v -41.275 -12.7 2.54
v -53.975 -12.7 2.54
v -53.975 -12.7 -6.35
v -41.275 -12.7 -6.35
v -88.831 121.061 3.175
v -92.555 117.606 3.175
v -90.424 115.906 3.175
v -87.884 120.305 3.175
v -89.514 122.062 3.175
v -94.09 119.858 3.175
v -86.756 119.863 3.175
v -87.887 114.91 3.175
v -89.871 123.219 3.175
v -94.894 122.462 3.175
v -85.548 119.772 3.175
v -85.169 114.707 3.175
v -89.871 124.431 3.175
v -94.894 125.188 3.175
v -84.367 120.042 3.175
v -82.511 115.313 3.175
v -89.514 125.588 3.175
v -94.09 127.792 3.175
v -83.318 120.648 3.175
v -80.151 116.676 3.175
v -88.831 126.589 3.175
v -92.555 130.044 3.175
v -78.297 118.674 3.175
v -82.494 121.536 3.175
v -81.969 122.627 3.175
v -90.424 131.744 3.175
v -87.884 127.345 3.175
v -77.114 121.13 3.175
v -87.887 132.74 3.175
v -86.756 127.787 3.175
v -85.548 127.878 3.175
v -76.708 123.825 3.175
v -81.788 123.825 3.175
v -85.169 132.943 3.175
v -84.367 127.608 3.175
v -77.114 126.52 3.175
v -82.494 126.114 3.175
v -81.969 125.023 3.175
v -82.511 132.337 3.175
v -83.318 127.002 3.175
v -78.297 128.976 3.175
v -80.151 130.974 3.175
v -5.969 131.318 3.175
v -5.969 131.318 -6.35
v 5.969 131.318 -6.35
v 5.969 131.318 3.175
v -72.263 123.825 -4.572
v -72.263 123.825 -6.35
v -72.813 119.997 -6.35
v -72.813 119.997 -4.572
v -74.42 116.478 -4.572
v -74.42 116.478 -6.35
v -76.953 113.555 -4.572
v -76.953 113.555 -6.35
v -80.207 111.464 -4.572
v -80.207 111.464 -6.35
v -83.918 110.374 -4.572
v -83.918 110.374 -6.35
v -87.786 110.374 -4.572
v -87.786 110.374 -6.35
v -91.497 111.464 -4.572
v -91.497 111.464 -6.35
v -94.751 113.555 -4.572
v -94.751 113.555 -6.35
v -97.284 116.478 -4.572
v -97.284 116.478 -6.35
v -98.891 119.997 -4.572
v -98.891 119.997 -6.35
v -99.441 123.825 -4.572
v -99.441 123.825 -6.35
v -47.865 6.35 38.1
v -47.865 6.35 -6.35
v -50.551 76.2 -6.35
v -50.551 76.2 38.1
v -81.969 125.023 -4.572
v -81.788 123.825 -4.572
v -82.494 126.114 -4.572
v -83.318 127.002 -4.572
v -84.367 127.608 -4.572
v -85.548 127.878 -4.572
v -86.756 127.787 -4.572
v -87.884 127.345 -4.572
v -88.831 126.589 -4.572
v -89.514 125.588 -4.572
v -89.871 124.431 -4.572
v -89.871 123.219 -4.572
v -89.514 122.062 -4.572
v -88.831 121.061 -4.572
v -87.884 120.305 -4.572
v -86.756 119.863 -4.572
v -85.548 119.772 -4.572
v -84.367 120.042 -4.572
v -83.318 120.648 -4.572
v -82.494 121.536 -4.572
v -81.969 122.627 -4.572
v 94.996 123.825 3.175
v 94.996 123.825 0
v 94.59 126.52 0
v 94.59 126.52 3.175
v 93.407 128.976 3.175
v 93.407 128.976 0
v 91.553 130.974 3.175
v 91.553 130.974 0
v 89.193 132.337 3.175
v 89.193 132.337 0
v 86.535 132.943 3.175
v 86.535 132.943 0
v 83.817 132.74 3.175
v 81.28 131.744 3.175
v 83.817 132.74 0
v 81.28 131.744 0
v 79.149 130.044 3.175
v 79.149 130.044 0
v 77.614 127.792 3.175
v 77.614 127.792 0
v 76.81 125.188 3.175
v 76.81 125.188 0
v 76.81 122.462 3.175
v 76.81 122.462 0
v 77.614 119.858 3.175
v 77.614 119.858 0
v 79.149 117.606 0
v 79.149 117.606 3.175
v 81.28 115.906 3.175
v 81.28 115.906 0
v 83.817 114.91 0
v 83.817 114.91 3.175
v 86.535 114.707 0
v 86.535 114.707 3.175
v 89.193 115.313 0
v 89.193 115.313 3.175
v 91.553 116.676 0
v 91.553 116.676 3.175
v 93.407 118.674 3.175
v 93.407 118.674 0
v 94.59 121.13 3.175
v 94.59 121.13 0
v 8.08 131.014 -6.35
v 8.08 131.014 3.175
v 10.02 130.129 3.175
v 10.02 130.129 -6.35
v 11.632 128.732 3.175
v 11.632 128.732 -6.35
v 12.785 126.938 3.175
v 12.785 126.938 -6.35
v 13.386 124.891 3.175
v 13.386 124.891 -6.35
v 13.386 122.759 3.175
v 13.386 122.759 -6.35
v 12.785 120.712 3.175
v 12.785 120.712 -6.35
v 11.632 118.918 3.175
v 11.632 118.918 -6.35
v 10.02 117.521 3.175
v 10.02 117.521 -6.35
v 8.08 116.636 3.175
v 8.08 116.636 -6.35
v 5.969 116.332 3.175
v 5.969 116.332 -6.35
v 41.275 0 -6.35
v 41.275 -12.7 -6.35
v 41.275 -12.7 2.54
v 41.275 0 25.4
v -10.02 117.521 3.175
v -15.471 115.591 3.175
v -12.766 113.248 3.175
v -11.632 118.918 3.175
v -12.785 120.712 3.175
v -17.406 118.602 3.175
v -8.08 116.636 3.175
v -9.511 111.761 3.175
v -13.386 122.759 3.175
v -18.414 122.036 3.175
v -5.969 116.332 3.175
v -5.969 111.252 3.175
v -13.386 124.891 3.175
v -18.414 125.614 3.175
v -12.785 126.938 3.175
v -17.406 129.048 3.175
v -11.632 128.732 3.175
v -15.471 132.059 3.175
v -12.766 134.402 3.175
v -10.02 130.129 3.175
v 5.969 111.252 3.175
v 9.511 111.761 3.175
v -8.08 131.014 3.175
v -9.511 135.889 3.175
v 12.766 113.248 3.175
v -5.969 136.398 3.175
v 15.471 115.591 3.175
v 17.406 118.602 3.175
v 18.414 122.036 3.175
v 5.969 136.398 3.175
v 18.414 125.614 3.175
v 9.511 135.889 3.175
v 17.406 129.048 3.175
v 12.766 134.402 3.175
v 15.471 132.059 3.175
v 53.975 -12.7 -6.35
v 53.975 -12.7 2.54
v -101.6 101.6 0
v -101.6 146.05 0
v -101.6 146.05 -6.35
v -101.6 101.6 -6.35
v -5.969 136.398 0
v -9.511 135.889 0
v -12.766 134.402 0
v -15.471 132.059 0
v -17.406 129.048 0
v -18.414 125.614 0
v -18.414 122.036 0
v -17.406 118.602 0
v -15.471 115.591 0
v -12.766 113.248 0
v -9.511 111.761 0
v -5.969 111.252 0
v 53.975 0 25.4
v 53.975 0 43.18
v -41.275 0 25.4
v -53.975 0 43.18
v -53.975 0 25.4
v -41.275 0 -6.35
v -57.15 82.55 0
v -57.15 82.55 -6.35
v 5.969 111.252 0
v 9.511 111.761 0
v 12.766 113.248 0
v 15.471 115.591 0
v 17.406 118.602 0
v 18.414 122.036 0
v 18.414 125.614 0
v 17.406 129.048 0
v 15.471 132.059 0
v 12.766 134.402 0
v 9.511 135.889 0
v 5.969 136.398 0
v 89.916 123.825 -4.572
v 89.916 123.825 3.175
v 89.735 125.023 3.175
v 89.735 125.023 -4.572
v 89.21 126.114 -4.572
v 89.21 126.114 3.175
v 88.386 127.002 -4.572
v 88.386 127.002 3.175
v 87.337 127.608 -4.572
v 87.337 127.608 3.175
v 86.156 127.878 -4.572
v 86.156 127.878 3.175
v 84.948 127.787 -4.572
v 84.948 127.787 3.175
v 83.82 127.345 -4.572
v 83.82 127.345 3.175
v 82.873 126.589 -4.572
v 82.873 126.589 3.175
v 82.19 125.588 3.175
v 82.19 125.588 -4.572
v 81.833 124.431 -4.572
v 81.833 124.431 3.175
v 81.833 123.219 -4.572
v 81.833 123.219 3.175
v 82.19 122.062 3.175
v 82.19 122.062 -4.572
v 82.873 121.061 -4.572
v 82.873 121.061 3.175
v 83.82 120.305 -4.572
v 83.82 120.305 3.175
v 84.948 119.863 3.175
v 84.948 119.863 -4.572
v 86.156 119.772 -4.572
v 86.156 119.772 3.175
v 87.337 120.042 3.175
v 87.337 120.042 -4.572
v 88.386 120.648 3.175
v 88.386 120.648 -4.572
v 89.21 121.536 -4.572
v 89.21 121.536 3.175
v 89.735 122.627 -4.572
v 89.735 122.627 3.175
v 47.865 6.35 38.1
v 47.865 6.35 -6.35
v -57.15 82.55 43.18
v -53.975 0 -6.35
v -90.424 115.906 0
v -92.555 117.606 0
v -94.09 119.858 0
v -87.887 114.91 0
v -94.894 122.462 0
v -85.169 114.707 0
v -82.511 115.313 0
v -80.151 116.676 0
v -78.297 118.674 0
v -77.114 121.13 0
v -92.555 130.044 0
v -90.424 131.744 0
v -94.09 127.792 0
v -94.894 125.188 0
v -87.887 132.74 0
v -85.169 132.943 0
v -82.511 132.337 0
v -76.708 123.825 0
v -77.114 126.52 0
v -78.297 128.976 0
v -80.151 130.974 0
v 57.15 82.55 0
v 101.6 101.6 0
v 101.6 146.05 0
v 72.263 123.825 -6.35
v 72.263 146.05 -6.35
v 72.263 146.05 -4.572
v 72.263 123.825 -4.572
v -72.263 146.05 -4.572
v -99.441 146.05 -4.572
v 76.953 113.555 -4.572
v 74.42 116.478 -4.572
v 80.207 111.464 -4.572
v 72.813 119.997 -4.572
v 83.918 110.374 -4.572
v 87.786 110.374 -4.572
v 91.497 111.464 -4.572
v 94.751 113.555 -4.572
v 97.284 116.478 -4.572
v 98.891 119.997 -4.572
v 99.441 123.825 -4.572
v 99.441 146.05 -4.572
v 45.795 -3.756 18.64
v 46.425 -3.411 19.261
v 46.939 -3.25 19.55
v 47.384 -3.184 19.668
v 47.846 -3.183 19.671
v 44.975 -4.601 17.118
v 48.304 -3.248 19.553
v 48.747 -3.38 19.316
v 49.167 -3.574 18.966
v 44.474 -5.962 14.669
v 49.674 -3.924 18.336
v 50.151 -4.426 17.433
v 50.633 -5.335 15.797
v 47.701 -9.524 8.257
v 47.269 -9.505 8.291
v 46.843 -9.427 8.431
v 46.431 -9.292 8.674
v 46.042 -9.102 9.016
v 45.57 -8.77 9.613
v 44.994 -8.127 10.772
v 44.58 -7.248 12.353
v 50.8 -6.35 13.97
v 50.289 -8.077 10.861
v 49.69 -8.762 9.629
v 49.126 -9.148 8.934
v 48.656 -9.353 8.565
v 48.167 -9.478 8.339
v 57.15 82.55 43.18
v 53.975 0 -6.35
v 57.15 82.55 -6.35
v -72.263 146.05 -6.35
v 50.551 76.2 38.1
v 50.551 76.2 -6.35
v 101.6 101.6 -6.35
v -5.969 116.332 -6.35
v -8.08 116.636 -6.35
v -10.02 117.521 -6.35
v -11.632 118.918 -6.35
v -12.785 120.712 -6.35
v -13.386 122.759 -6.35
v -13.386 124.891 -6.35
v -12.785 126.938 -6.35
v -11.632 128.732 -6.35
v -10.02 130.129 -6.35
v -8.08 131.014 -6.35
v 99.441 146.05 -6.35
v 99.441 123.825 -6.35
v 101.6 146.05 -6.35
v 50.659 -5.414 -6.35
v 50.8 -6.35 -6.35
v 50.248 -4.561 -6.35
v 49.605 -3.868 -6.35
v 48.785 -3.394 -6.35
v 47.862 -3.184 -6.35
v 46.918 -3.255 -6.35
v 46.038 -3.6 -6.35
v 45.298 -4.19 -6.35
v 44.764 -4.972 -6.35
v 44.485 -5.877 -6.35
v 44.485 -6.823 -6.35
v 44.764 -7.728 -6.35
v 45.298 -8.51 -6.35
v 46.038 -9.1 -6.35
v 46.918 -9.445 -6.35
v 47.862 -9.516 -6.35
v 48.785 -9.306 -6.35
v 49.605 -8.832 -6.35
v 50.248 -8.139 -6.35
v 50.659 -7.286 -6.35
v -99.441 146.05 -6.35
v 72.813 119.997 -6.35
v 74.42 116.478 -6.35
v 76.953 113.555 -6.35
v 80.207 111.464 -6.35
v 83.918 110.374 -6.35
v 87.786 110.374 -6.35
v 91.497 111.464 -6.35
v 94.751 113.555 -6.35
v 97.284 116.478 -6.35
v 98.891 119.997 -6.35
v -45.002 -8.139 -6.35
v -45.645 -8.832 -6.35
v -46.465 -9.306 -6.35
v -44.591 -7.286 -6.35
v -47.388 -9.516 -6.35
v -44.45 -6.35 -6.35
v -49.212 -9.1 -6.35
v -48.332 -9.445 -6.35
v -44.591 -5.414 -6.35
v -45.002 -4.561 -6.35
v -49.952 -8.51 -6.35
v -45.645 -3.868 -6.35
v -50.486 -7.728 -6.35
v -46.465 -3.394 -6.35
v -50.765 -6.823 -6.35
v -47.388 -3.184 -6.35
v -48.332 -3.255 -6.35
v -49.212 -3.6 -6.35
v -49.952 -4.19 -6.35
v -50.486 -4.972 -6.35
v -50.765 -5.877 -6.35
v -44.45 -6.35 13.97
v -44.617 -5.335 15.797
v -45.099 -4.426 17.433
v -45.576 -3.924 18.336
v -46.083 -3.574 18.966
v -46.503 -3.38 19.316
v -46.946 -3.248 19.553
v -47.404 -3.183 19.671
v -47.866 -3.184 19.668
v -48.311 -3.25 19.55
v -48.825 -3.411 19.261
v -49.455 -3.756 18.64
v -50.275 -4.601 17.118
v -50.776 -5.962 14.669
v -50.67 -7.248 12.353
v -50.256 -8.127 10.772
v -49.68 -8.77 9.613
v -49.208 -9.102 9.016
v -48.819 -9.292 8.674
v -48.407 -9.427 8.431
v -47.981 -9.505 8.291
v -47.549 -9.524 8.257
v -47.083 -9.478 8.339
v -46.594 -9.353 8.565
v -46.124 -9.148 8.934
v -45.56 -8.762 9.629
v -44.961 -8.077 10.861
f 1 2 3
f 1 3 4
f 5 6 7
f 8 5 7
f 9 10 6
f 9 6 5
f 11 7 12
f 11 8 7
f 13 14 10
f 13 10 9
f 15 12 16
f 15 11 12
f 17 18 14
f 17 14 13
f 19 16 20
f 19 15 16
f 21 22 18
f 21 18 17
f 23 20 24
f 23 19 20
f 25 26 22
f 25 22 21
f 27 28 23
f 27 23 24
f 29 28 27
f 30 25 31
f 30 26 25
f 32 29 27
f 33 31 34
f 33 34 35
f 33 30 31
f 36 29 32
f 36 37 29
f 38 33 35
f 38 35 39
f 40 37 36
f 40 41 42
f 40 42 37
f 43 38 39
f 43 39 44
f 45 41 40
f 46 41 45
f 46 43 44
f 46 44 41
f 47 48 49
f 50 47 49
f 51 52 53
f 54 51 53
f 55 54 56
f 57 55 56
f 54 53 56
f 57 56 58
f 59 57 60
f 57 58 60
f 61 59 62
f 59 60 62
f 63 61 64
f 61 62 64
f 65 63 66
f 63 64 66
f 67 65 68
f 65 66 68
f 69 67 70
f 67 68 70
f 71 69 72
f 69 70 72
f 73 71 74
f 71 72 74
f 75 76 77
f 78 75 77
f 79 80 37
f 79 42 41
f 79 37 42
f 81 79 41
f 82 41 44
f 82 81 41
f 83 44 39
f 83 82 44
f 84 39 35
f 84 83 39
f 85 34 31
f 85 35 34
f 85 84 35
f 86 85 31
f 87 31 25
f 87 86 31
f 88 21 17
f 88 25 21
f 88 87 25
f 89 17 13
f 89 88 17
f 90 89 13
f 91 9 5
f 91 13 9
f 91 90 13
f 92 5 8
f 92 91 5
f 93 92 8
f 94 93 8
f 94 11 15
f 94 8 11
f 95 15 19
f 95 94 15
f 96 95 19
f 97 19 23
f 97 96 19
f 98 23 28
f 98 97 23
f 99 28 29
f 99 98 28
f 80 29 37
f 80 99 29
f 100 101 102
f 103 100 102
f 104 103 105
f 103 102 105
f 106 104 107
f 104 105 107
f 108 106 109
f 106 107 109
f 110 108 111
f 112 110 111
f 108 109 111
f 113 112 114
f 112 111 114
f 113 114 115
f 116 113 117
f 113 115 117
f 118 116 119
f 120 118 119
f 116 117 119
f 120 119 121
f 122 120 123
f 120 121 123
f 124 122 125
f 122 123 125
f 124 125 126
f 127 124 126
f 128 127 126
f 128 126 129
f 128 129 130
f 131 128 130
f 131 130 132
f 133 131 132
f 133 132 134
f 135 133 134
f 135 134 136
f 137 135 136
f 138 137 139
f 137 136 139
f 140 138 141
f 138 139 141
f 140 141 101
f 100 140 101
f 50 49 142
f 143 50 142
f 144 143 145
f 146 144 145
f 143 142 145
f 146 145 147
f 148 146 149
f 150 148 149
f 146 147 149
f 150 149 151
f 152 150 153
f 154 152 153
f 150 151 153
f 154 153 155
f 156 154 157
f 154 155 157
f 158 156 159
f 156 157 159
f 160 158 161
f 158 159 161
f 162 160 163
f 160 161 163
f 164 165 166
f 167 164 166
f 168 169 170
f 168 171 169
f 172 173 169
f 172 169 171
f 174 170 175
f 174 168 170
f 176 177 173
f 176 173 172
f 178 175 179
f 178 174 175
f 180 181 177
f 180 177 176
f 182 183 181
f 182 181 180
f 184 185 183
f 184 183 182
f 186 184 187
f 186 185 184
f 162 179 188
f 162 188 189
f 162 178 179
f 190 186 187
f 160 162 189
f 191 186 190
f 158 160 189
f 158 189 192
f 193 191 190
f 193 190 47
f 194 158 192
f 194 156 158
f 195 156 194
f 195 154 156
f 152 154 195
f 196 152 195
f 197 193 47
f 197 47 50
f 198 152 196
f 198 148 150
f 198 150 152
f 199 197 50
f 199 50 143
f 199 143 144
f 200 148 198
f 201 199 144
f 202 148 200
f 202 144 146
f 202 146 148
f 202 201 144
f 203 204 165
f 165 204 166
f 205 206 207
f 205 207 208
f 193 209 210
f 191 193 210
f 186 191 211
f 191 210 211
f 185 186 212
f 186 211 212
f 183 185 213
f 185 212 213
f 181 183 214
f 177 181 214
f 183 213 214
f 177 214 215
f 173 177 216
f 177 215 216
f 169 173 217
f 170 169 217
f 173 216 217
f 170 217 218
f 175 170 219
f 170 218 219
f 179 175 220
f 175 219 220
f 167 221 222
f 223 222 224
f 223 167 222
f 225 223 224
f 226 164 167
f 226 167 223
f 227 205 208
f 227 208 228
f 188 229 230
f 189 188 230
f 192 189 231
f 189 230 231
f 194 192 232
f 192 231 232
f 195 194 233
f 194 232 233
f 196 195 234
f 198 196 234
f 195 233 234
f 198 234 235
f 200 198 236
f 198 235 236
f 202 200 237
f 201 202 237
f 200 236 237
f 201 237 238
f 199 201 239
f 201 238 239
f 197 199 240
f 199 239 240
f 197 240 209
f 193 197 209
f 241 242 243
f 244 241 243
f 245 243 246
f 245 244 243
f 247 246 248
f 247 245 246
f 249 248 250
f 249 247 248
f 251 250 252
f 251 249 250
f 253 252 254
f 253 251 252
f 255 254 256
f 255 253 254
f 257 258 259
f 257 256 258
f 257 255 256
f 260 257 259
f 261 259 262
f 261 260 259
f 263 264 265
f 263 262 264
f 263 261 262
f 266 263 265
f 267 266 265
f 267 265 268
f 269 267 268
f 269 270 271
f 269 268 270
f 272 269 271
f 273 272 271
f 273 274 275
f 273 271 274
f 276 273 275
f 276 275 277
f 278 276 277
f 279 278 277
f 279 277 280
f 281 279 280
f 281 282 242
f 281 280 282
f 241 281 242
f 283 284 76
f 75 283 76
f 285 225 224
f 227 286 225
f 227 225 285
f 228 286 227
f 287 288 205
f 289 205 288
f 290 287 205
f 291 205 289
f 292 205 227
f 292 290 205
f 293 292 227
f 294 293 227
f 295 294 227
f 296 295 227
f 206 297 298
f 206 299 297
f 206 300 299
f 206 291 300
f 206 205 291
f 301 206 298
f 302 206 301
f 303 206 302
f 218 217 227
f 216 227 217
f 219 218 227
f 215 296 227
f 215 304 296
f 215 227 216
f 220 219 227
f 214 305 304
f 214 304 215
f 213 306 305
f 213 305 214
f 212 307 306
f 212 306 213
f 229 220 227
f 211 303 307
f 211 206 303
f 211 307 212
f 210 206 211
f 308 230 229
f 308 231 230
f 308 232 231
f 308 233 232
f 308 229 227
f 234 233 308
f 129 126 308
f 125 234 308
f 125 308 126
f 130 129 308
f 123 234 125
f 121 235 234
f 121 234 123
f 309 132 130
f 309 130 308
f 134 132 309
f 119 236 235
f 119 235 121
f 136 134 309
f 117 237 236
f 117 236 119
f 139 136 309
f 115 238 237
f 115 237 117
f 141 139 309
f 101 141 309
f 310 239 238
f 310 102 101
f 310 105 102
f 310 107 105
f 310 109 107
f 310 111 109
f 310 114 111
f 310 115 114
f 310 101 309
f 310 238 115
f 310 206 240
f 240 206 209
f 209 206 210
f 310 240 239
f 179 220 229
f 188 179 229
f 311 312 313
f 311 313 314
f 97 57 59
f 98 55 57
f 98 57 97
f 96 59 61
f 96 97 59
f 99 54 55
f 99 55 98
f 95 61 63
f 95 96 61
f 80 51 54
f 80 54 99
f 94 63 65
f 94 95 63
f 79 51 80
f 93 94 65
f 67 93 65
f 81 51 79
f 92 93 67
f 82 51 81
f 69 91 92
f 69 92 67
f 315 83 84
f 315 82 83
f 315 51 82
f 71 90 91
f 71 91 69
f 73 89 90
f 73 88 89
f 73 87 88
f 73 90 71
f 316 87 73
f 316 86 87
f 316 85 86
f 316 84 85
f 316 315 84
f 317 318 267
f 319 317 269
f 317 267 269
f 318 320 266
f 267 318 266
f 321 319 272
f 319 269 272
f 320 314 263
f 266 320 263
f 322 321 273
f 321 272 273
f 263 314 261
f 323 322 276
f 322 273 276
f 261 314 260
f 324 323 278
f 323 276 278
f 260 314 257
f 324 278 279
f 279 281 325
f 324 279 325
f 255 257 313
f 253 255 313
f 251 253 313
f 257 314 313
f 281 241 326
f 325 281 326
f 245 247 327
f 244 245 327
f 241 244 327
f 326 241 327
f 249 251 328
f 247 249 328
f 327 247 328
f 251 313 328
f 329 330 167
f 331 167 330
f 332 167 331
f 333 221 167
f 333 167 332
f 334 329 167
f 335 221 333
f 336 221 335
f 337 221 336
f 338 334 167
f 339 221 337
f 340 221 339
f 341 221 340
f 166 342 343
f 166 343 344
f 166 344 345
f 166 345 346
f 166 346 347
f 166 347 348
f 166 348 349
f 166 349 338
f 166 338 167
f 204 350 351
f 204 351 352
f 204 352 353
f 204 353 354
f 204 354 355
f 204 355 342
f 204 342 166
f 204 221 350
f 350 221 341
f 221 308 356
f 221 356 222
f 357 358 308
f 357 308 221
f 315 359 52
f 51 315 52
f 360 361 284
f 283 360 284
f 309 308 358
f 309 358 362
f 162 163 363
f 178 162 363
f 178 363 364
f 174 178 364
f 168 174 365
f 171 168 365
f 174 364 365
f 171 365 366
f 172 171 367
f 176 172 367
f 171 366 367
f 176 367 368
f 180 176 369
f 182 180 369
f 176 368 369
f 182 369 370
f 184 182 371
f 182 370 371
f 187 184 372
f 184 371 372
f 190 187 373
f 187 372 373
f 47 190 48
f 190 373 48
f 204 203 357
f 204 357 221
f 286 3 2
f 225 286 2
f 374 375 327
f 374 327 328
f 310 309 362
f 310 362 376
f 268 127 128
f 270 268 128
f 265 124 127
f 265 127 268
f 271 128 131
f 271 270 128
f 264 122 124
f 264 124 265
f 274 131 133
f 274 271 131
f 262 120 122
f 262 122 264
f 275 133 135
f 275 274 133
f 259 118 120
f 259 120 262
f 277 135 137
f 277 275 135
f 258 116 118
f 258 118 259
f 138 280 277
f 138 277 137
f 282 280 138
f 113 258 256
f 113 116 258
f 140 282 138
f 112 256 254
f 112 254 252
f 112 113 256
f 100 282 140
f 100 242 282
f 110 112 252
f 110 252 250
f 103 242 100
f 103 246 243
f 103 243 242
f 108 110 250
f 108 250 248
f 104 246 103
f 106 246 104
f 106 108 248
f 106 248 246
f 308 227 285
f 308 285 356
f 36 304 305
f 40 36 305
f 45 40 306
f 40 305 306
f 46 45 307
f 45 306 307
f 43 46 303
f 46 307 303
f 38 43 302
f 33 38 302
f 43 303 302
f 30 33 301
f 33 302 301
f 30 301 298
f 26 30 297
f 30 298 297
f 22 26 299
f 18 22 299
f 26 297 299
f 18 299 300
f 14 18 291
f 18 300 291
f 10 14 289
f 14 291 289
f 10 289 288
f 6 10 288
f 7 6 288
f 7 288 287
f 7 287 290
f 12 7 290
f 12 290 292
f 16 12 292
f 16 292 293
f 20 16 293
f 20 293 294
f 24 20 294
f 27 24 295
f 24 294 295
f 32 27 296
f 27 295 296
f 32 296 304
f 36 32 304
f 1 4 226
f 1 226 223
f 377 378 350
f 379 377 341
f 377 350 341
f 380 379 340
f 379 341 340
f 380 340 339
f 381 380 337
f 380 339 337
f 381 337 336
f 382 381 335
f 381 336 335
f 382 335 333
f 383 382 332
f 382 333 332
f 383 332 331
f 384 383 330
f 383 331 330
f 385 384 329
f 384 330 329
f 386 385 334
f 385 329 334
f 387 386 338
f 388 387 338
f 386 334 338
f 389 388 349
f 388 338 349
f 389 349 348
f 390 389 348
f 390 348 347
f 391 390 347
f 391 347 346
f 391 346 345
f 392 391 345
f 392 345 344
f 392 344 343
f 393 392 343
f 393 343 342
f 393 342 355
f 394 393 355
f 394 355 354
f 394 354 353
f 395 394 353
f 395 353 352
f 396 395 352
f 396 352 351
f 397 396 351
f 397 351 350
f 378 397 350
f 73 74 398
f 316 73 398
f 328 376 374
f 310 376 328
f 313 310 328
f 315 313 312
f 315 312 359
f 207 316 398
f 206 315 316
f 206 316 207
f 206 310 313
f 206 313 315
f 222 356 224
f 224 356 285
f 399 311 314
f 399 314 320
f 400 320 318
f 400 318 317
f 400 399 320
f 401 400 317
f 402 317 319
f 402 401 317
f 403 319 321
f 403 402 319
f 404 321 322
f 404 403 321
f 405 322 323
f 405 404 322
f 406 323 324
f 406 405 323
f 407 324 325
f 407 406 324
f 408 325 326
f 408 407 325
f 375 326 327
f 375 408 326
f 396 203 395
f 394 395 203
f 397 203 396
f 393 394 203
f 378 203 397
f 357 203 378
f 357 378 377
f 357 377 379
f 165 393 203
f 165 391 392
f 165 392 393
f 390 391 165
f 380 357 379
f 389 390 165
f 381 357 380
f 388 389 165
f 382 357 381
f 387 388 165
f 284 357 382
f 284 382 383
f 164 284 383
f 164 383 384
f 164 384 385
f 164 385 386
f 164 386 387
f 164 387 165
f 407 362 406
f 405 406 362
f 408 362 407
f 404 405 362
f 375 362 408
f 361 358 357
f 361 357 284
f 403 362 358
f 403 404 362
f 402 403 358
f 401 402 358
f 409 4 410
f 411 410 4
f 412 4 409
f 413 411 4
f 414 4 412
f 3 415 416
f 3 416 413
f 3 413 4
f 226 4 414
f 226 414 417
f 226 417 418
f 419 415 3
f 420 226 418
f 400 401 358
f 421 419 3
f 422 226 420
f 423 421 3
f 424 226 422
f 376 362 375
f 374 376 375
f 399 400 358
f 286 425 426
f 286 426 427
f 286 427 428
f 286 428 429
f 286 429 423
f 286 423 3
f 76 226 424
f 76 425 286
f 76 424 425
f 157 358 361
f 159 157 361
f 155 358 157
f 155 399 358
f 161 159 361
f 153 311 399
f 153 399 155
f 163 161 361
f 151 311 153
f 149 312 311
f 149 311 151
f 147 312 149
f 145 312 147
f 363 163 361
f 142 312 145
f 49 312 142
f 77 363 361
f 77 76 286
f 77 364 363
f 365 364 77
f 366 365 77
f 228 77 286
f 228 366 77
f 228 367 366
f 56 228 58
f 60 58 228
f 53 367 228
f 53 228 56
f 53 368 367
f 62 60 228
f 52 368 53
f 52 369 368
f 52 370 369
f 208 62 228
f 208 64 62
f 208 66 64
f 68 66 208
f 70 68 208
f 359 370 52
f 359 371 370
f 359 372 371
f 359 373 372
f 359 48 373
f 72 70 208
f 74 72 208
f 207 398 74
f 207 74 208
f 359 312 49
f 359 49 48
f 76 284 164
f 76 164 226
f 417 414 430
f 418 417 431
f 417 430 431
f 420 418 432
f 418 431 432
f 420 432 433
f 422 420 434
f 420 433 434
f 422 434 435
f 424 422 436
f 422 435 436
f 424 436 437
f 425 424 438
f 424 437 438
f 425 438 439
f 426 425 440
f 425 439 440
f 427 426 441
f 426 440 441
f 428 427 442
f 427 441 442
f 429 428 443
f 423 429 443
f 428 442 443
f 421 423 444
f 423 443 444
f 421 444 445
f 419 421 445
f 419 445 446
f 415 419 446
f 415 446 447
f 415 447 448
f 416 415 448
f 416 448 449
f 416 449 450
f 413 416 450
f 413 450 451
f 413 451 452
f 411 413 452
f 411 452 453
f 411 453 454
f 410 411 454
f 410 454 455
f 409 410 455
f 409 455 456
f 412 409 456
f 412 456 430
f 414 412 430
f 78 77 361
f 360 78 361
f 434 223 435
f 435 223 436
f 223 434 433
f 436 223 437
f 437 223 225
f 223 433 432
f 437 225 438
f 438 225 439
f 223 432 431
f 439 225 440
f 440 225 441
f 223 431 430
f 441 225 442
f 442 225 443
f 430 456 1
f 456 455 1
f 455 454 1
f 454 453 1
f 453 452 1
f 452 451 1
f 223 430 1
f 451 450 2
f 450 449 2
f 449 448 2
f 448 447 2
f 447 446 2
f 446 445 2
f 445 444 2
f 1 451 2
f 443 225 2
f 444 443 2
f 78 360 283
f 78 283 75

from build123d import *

# Parameters (mm, degrees)
MAIN_BODY_DEPTH                    = 6.35
POCKET_OUTER_SURFACE_DEPTH         = 43.18
POCKET_INSIDE_DEPTH                = 44.45
SKETCH8_W                          = 12.7
SKETCH8_H                          = 31.75
BOTTOM_SCREW_MOUNT_DEPTH           = 12.7
BOTTOM_SCREW_MOUNT_EXTRUSION_DEPTH = 218.712414724
LIGHT_SOCKETS_DEPTH                = 184.078329957
LIGHT_SOCKETS_DEPTH_BACK           = 6.35
SKETCH17_R                         = 4.064
SKETCH18_R                         = 9.144
LIGHT_LIP_LINERS_DEPTH             = 3.175
LIGHT_LIP_SOCKETS_REACH            = 185.078
SKETCH17_2_R                       = 4.064
TAB_SLOTS_DEPTH                    = 1.778
F_1_4_0_25_DIAMETER_HOLE1_D        = 6.35


# Sheet-metal steps are written as plain solids
with BuildPart() as part:
    # Sketch1 → Main Body (new body)
    with BuildSketch(Plane.XY):
        Polygon((-53.975, 0), (53.975, 0), (57.15, 82.55), (101.6, 101.6), (101.6, 146.05), (-101.6, 146.05), (-101.6, 101.6), (-57.15, 82.55), align=None)
    extrude(amount=-MAIN_BODY_DEPTH)

    # Sketch6 → Pocket-Outer Surface (add)
    with BuildSketch(Plane.XY):
        Polygon((53.975, 0), (-53.975, 0), (-57.15, 82.55), (57.15, 82.55), align=None)
    extrude(amount=POCKET_OUTER_SURFACE_DEPTH)

    # Sketch7 → Pocket-Inside (cut)
    with BuildSketch(Plane(origin=(0, 0, -6.35), x_dir=(-1, 0, 0), z_dir=(0, 0, -1))):
        Polygon((-50.551074221, 76.2), (-47.864535759, 6.35), (47.864535759, 6.35), (50.551074221, 76.2), align=None)
    extrude(amount=-POCKET_INSIDE_DEPTH, mode=Mode.SUBTRACT)

    # Sketch8 → Bottom Screw Mount (add)
    with BuildSketch(Plane.XZ):
        with Locations((-47.625, 9.525)):
            Rectangle(SKETCH8_W, SKETCH8_H)
    bottom_screw_mount = extrude(amount=BOTTOM_SCREW_MOUNT_DEPTH)

    # Sketch9 → Bottom Screw Mount Extrusion (cut, through all)
    with BuildSketch(Plane.ZY.offset(53.975)):
        Polygon((2.54, -12.7), (25.4, -12.7), (25.4, 0), align=None)
    bottom_screw_mount_extrusion = extrude(amount=-BOTTOM_SCREW_MOUNT_EXTRUSION_DEPTH, mode=Mode.SUBTRACT)

    # Left Bottom Screw Mount: Bottom Screw Mount, Bottom Screw Mount Extrusion across plane
    add(bottom_screw_mount.mirror(Plane(origin=(0, 0, 0), x_dir=(0, 0, 1), z_dir=(1, 0, 0))))
    add(bottom_screw_mount_extrusion.mirror(Plane(origin=(0, 0, 0), x_dir=(0, 0, 1), z_dir=(1, 0, 0))), mode=Mode.SUBTRACT)

    # Sketch17 → Light Sockets (cut, two sides: drawn at the far end of the back side and taken through both)
    with BuildSketch(Plane.XY.offset(-LIGHT_SOCKETS_DEPTH_BACK)):
        with Locations((85.852, 123.825)):
            Circle(SKETCH17_R)
        with Locations((-85.852, 123.825)):
            Circle(SKETCH17_R)
        with BuildLine():
            Line((-5.969, 131.318), (5.969, 131.318))
            ThreePointArc((5.969, 131.318), (13.462, 123.825), (5.969, 116.332))
            Line((5.969, 116.332), (-5.969, 116.332))
            ThreePointArc((-5.969, 116.332), (-13.462, 123.825), (-5.969, 131.318))
        make_face()
    extrude(amount=LIGHT_SOCKETS_DEPTH + LIGHT_SOCKETS_DEPTH_BACK, mode=Mode.SUBTRACT)

    # Sketch18 → Light Lip Liners (add)
    with BuildSketch(Plane.XY):
        with Locations((-85.852, 123.825)):
            Circle(SKETCH18_R)
        with Locations((85.852, 123.825)):
            Circle(SKETCH18_R)
        with BuildLine():
            Line((5.969, 136.398), (-5.969, 136.398))
            ThreePointArc((-5.969, 136.398), (-18.542, 123.825), (-5.969, 111.252))
            Line((-5.969, 111.252), (5.969, 111.252))
            ThreePointArc((5.969, 111.252), (18.542, 123.825), (5.969, 136.398))
        make_face()
    extrude(amount=LIGHT_LIP_LINERS_DEPTH)

    # Sketch17<2> → Light Lip Sockets (cut, up to next)
    with BuildSketch(Plane.XY, mode=Mode.PRIVATE) as light_lip_sockets_sk1:
        with Locations((85.852, 123.825)):
            Circle(SKETCH17_2_R)
    light_lip_sockets_tool1 = extrude(light_lip_sockets_sk1.sketch, amount=LIGHT_LIP_SOCKETS_REACH, mode=Mode.PRIVATE) & part.part
    # Sketch17<2> → Light Lip Sockets (cut, up to next)
    with BuildSketch(Plane.XY, mode=Mode.PRIVATE) as light_lip_sockets_sk2:
        with Locations((-85.852, 123.825)):
            Circle(SKETCH17_2_R)
    light_lip_sockets_tool2 = extrude(light_lip_sockets_sk2.sketch, amount=LIGHT_LIP_SOCKETS_REACH, mode=Mode.PRIVATE) & part.part
    # Sketch17<2> → Light Lip Sockets (cut, up to next)
    with BuildSketch(Plane.XY, mode=Mode.PRIVATE) as light_lip_sockets_sk3:
        with BuildLine():
            Line((-5.969, 131.318), (5.969, 131.318))
            ThreePointArc((5.969, 131.318), (13.462, 123.825), (5.969, 116.332))
            Line((5.969, 116.332), (-5.969, 116.332))
            ThreePointArc((-5.969, 116.332), (-13.462, 123.825), (-5.969, 131.318))
        make_face()
    light_lip_sockets_tool3 = extrude(light_lip_sockets_sk3.sketch, amount=LIGHT_LIP_SOCKETS_REACH, mode=Mode.PRIVATE) & part.part
    add(light_lip_sockets_tool1.solids().sort_by_distance((85.852, 123.825, 0))[0], mode=Mode.SUBTRACT)
    add(light_lip_sockets_tool2.solids().sort_by_distance((-85.852, 123.825, 0))[0], mode=Mode.SUBTRACT)
    add(light_lip_sockets_tool3.solids().sort_by_distance((0, 123.825, 0))[0], mode=Mode.SUBTRACT)

    # Sketch19 → Tab Slots (cut)
    with BuildSketch(Plane(origin=(0, 0, -6.35), x_dir=(-1, 0, 0), z_dir=(0, 0, -1))):
        with BuildLine():
            Line((72.263, 146.05), (72.263, 123.825))
            ThreePointArc((72.263, 123.825), (85.852, 110.236), (99.441, 123.825))
            Line((99.441, 123.825), (99.441, 146.05))
            Line((99.441, 146.05), (72.263, 146.05))
        make_face()
    tab_slots = extrude(amount=-TAB_SLOTS_DEPTH, mode=Mode.SUBTRACT)

    # Mirror3: Tab Slots across plane
    add(tab_slots.mirror(Plane(origin=(0, 0, 0), x_dir=(0, 0, 1), z_dir=(1, 0, 0))), mode=Mode.SUBTRACT)

    # 1/4 (0.25) Diameter Hole1 (through all)
    with Locations(Plane(origin=(0, 0, -6.35), x_dir=(-1, 0, 0), z_dir=(0, 0, -1))):
        with Locations((-47.625, -6.35), (47.625, -6.35)):
            Hole(F_1_4_0_25_DIAMETER_HOLE1_D / 2)


solid = part.part
